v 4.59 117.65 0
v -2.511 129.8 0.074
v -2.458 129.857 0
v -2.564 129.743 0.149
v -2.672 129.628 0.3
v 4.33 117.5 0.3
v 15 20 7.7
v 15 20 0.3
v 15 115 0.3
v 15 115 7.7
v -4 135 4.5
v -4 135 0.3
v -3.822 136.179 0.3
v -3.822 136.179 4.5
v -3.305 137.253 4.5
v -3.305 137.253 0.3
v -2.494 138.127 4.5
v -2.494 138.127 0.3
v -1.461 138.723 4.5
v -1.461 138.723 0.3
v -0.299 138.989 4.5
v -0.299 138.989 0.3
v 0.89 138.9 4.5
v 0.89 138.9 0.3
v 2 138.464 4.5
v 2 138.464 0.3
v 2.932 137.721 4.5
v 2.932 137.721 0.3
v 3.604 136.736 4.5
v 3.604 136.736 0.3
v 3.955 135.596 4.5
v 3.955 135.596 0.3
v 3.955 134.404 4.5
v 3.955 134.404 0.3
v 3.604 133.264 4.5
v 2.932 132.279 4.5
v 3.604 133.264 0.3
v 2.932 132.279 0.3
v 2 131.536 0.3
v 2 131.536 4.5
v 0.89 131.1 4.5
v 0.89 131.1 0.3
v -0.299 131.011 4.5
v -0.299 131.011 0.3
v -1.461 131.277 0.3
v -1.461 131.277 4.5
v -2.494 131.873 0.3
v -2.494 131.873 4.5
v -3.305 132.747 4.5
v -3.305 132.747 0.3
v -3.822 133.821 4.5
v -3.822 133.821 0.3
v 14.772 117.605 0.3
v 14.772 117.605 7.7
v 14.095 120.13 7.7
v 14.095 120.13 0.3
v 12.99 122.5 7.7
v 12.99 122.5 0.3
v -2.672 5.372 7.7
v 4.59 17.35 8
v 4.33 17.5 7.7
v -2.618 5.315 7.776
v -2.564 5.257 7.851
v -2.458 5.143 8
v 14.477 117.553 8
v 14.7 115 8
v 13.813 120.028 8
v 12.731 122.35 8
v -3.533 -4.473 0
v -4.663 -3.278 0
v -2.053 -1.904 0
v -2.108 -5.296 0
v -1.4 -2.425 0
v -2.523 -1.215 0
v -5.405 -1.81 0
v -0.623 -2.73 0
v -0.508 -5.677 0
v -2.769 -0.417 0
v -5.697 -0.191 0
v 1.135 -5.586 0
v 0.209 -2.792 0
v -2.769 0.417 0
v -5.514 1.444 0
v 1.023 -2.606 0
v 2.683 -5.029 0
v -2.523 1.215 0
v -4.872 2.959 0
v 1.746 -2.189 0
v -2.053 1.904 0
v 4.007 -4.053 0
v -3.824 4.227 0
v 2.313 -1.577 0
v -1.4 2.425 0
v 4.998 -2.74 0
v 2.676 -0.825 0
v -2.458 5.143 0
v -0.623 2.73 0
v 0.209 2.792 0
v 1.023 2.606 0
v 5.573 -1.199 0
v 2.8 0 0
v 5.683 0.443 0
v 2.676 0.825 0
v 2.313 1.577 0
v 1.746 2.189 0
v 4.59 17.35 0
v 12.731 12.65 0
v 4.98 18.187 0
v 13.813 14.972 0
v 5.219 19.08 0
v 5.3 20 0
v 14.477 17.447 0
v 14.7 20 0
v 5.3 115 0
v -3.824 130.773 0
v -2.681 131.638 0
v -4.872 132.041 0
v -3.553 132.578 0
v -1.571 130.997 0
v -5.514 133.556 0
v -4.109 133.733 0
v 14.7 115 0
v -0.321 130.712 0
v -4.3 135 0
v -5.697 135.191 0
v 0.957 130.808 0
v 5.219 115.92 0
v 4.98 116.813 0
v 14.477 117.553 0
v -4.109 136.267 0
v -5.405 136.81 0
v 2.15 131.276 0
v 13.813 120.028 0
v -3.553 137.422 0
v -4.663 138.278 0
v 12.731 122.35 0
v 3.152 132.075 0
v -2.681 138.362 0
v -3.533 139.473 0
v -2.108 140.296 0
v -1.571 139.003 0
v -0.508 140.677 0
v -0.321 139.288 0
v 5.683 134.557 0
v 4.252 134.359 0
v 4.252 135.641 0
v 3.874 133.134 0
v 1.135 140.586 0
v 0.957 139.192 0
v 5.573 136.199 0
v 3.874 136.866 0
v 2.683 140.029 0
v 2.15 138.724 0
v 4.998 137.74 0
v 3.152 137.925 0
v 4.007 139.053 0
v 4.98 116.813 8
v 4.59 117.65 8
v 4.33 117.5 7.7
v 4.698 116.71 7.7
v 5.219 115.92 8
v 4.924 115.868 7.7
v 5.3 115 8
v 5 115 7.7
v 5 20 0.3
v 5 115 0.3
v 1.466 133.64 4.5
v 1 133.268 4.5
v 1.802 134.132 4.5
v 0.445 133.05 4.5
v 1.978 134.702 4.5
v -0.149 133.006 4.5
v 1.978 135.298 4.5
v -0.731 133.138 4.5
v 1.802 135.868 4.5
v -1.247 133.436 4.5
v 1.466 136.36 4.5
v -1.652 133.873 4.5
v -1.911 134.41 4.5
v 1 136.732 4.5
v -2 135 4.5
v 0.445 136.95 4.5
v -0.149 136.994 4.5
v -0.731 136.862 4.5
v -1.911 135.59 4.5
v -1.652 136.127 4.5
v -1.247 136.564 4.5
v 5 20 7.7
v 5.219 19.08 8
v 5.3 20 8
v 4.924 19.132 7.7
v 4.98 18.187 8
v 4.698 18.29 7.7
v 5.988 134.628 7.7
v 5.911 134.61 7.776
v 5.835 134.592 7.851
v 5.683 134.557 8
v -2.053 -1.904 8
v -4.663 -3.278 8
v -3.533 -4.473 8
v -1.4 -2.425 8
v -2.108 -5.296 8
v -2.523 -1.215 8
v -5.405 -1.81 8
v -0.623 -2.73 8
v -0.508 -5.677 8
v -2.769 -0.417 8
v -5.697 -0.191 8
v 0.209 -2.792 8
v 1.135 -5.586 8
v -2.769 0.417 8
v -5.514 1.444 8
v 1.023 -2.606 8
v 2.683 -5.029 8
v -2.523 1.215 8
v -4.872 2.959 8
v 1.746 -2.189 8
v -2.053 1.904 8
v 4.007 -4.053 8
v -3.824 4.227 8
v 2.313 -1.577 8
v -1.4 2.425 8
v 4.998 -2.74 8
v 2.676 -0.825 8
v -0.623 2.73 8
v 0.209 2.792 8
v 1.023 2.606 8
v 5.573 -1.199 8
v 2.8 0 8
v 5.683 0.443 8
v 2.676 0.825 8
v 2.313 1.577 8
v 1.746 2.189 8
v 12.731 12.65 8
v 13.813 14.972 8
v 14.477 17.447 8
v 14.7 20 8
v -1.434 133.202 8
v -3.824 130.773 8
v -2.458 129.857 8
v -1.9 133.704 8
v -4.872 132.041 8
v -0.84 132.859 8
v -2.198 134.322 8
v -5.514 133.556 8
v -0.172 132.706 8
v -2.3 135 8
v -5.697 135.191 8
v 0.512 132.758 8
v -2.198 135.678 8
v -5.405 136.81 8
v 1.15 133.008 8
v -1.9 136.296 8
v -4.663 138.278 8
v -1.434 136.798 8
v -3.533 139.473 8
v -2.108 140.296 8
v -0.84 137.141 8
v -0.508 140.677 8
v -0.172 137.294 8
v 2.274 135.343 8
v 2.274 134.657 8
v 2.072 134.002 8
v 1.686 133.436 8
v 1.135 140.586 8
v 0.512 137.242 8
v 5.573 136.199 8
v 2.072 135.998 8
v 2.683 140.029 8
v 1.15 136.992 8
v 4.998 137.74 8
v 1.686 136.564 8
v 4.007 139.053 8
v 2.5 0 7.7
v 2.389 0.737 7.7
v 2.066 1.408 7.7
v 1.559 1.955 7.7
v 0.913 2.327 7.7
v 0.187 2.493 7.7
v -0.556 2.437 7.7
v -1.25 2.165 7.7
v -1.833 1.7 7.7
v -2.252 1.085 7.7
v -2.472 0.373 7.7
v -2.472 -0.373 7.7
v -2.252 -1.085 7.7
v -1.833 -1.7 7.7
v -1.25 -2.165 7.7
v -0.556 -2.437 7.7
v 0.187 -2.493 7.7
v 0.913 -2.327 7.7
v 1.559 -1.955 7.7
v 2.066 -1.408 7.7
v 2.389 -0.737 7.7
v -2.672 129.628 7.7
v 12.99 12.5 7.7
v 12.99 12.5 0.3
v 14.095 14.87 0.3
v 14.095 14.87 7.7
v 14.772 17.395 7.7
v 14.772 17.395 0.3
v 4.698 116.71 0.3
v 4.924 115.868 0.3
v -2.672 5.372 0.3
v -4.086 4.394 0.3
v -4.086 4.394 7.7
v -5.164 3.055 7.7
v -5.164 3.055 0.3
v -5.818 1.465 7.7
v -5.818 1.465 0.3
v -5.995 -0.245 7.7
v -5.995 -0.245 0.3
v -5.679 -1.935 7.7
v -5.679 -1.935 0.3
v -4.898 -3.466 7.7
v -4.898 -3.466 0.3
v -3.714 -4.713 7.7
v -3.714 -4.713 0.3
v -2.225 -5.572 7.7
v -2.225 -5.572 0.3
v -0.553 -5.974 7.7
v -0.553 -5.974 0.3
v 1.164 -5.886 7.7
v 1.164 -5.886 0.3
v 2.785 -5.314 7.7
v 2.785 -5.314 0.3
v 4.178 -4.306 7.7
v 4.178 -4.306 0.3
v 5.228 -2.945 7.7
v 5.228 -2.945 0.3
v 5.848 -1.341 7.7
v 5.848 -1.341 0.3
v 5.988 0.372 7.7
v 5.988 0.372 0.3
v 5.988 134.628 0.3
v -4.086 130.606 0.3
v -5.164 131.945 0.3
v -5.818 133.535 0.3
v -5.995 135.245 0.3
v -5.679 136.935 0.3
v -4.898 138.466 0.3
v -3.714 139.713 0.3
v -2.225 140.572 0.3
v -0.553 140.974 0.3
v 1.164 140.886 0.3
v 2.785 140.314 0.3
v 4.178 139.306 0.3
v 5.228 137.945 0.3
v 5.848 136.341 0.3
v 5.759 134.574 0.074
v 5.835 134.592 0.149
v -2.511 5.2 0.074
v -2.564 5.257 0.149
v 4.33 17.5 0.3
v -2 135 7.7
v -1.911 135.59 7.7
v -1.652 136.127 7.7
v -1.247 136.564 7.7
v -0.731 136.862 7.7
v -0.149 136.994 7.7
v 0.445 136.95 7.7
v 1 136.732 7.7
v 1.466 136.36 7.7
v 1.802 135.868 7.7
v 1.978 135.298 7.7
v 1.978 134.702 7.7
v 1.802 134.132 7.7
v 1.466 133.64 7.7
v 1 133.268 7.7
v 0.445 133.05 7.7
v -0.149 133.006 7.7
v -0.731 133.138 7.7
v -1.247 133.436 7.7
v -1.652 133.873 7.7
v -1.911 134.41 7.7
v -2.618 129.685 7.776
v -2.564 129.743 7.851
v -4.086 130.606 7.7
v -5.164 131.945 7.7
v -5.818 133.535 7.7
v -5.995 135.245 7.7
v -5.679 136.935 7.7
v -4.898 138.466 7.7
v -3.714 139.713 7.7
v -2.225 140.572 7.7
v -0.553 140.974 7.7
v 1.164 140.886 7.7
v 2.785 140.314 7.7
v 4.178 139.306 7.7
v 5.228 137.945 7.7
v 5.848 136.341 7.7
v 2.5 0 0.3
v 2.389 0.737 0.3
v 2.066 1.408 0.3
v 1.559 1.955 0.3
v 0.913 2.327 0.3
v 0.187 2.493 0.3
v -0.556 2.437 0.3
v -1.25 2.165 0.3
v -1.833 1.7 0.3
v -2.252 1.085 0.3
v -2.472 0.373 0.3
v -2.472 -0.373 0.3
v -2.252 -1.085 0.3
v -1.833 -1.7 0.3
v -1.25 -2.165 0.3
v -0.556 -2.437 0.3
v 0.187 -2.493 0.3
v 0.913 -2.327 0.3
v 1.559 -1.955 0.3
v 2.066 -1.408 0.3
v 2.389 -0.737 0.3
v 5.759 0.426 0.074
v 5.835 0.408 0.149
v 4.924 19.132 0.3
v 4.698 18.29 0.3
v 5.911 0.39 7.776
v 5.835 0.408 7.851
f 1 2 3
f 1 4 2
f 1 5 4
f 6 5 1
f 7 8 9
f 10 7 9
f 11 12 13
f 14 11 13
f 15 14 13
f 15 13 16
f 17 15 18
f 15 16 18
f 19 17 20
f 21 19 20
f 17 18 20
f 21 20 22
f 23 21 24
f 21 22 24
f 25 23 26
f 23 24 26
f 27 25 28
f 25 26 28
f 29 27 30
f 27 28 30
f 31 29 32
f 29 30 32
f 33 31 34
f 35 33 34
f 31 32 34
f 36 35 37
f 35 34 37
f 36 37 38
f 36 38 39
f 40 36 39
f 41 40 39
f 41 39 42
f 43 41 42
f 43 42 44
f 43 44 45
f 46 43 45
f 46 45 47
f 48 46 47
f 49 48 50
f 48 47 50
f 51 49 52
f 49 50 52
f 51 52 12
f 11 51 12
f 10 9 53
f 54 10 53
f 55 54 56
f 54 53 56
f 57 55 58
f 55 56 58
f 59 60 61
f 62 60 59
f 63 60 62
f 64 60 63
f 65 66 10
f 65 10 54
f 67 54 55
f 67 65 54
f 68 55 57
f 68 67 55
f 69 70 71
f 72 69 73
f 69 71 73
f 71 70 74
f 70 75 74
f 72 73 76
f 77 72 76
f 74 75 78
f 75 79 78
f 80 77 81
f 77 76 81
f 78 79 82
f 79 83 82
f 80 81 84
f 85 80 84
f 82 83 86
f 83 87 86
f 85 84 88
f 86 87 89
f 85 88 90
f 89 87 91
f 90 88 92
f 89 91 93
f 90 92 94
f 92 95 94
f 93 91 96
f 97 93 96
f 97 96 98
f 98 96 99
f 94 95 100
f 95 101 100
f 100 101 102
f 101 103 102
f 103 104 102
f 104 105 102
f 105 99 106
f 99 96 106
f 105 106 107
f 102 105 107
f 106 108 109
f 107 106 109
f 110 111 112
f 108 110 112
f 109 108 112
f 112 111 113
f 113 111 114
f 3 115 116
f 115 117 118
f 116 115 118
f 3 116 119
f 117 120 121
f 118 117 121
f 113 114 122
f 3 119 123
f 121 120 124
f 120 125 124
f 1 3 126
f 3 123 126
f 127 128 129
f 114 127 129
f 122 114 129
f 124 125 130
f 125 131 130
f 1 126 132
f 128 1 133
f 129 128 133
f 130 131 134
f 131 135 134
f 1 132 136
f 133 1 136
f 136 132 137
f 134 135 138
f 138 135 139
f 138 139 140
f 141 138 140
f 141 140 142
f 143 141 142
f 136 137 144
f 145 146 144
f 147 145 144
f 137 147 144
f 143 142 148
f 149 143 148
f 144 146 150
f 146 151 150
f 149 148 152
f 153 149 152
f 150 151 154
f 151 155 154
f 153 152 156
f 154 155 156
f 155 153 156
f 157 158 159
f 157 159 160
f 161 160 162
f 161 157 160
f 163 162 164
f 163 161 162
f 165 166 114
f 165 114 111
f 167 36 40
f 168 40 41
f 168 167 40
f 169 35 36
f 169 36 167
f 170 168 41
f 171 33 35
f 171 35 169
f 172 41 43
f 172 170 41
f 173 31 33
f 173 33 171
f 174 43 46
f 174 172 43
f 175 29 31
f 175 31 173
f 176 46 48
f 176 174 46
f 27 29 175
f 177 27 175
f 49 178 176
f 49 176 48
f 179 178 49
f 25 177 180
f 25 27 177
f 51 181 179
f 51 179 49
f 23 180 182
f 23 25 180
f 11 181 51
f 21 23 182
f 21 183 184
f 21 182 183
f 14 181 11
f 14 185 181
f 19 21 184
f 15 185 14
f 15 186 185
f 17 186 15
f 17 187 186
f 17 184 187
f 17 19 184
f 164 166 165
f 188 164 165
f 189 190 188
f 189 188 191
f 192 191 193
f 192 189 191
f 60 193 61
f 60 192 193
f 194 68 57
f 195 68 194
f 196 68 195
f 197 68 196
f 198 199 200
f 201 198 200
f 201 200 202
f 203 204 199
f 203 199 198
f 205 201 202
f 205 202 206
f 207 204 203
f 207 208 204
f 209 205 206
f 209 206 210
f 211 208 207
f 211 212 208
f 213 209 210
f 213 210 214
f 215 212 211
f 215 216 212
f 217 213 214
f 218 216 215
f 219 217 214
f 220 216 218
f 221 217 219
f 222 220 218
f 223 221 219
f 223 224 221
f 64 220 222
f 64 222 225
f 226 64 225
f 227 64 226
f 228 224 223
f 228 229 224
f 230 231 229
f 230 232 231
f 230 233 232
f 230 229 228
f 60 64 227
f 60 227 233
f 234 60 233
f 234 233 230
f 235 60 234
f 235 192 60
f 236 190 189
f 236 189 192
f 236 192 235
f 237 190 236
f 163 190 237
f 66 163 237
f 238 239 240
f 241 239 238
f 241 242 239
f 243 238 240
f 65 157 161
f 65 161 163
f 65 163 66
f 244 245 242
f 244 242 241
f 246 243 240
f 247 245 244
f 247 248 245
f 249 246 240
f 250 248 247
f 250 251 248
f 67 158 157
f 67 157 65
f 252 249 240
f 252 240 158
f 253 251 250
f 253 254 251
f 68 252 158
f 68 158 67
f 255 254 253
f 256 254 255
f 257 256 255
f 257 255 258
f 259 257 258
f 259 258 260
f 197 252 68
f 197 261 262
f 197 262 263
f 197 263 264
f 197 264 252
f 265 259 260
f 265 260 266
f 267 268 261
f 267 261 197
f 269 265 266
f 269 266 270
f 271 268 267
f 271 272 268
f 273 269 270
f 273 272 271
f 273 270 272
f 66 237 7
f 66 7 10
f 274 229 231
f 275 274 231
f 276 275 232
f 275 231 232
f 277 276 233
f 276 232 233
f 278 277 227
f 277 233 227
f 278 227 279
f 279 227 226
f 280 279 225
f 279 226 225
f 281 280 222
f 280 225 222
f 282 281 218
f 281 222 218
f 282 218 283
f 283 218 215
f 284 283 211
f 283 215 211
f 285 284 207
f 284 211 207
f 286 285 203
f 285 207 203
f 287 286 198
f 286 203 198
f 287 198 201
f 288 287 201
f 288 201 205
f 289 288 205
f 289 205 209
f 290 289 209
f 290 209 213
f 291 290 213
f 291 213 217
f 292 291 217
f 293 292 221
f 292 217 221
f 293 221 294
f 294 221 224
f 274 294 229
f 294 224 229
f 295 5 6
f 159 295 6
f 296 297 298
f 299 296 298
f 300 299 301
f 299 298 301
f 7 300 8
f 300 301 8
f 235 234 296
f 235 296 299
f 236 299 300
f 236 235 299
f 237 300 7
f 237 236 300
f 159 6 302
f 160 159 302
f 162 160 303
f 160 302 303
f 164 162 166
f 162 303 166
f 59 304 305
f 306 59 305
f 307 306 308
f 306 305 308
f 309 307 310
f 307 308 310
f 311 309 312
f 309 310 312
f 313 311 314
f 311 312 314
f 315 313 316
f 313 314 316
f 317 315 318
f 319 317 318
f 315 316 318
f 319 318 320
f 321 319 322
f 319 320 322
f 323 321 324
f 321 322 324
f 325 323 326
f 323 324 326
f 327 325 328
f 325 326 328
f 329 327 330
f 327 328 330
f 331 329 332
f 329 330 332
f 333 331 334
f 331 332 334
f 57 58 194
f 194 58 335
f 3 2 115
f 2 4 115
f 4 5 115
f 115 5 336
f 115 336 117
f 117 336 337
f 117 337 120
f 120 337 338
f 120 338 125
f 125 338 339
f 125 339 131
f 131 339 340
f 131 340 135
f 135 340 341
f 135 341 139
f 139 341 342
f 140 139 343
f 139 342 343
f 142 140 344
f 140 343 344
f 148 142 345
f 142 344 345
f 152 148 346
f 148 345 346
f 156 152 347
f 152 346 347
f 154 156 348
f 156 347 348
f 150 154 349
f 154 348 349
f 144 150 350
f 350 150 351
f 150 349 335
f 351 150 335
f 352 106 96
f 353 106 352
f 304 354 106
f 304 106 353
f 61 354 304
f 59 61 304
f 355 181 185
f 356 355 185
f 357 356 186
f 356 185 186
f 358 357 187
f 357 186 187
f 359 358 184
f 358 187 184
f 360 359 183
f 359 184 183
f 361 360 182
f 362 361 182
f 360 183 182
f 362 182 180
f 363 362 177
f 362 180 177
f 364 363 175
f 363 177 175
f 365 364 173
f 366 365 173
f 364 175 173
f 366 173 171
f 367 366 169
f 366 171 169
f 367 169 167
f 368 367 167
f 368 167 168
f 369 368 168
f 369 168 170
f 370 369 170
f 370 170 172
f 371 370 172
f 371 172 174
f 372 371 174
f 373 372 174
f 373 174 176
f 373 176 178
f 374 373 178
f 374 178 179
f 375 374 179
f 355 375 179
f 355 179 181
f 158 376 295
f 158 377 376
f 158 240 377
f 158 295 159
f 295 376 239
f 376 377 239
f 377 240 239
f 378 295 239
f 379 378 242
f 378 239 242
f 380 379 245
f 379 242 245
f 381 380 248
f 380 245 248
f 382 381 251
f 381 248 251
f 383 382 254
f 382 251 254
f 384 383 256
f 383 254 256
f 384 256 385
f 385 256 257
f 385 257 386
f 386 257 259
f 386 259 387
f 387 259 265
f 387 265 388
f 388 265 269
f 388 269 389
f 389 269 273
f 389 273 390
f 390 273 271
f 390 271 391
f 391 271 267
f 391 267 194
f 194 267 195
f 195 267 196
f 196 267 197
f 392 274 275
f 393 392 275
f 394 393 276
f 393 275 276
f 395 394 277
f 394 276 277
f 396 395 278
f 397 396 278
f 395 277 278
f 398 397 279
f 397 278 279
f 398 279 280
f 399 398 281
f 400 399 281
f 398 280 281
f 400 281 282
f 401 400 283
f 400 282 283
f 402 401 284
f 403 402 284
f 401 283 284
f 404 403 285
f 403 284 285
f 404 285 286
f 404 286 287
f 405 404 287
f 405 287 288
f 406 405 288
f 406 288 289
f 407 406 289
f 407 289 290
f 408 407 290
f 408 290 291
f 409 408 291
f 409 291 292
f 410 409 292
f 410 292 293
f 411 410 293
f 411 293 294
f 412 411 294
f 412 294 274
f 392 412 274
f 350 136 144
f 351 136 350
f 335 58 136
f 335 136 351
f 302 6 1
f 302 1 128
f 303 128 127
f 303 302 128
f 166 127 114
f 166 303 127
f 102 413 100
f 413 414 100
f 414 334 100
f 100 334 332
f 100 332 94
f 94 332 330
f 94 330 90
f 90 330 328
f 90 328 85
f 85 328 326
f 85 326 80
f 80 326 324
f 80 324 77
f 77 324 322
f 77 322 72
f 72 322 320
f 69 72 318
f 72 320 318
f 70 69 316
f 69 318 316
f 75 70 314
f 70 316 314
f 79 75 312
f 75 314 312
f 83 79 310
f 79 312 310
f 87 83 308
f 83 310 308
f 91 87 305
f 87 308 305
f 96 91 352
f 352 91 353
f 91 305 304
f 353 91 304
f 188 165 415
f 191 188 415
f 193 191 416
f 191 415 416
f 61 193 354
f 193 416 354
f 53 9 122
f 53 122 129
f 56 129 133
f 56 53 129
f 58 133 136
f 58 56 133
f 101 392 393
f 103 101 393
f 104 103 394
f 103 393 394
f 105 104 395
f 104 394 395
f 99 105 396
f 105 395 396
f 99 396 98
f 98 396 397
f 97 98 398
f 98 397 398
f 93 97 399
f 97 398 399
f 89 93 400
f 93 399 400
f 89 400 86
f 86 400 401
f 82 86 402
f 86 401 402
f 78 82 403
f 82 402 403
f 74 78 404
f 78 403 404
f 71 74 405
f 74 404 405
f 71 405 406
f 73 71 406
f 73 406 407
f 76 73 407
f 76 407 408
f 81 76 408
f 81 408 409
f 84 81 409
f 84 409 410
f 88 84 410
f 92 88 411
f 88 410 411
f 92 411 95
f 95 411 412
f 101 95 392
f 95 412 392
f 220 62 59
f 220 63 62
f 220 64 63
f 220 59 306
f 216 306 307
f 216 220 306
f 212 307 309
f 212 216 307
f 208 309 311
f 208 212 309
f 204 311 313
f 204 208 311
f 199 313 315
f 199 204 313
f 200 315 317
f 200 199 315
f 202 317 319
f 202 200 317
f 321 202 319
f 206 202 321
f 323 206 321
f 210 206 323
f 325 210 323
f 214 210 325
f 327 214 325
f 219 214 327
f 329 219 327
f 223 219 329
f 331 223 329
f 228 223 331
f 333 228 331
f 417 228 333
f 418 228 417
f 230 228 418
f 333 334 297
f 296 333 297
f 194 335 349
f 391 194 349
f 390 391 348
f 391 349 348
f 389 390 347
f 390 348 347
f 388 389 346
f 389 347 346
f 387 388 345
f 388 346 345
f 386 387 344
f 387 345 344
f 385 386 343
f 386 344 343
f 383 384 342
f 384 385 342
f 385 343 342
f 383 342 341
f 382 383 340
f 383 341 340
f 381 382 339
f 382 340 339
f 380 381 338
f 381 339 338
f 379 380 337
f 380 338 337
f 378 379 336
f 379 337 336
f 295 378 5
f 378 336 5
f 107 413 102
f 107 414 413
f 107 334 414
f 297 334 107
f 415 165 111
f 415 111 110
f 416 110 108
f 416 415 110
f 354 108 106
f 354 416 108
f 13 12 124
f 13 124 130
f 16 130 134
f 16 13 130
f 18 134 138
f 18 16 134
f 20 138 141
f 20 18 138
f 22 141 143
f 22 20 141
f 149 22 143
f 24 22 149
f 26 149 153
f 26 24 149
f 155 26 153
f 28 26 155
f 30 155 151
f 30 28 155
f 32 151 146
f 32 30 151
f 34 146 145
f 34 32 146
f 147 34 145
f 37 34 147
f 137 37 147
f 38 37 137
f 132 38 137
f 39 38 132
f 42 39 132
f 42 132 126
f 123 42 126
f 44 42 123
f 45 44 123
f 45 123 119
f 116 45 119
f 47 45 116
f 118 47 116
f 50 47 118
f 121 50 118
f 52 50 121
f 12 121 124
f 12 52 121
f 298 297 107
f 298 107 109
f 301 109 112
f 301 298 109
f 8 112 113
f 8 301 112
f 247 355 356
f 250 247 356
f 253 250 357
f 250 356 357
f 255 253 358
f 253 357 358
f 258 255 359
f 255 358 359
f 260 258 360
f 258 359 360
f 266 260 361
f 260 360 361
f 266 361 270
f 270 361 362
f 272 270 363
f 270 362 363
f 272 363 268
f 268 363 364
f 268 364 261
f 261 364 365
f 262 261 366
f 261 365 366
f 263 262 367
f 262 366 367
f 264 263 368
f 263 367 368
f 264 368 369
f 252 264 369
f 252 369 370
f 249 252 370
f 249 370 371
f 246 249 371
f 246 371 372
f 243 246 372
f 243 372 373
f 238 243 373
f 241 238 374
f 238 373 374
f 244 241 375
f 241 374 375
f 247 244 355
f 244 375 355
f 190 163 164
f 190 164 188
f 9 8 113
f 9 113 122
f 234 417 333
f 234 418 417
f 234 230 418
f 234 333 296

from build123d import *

# Parameters (mm, degrees)
SKETCH_1_R          = 6
EXTRUDE_1_DEPTH     = 8
EXTRUDE_1_2_DEPTH   = 8
EXTRUDE_1_3_DEPTH   = 8
SKETCH_3_R          = 2.5
CUT_EXTRUDE_1_DEPTH = 9
SKETCH_4_R          = 2
CUT_EXTRUDE_2_DEPTH = 9
SKETCH_5_R          = 4
CUT_EXTRUDE_3_DEPTH = 4.5
CHAMFER_1_SIZE      = 0.3


with BuildPart() as part:
    # 草图1 → Extrude 1 (new body)
    with BuildSketch(Plane.XY):
        Circle(SKETCH_1_R)
    extrude(amount=EXTRUDE_1_DEPTH)



with BuildPart() as body_2:
    # 草图1 → Extrude 1 2 (new body)
    with BuildSketch(Plane.XY):
        with Locations((0, 135)):
            Circle(SKETCH_1_R)
    extrude(amount=EXTRUDE_1_2_DEPTH)


with BuildPart() as part_1:
    add(part.part)

    add(body_2.part)  # Extrude 1 3 merges body 2
    # 草图2 → Extrude 1 3 (add)
    with BuildSketch(Plane.XY):
        with BuildLine():
            Line((-4.330127019, 132.5), (4.330127019, 117.5))
            ThreePointArc((4.330127019, 117.5), (4.829629131, 116.294095226), (5, 115))
            Line((5, 115), (5, 20))
            ThreePointArc((5, 20), (4.829629131, 18.705904774), (4.330127019, 17.5))
            Line((4.330127019, 17.5), (-4.330127019, 2.5))
            Line((-4.330127019, 2.5), (4.330127019, -2.5))
            Line((4.330127019, -2.5), (12.990381057, 12.5))
            ThreePointArc((12.990381057, 12.5), (14.488887394, 16.117714323), (15, 20))
            Line((15, 20), (15, 115))
            ThreePointArc((15, 115), (14.488887394, 118.882285677), (12.990381057, 122.5))
            Line((12.990381057, 122.5), (4.330127019, 137.5))
            Line((4.330127019, 137.5), (-4.330127019, 132.5))
        make_face()
    extrude(amount=EXTRUDE_1_3_DEPTH)

    # 草图3 → 切除-拉伸1 (cut, through all)
    with BuildSketch(Plane.XY.offset(8)):
        Circle(SKETCH_3_R)
    extrude(amount=-CUT_EXTRUDE_1_DEPTH, mode=Mode.SUBTRACT)

    # 草图4 → 切除-拉伸2 (cut, through all)
    with BuildSketch(Plane(origin=(0, 0, 0), x_dir=(-1, 0, 0), z_dir=(0, 0, -1))):
        with Locations((0, 135)):
            Circle(SKETCH_4_R)
    extrude(amount=-CUT_EXTRUDE_2_DEPTH, mode=Mode.SUBTRACT)

    # 草图5 → 切除-拉伸3 (cut)
    with BuildSketch(Plane(origin=(0, 0, 0), x_dir=(-1, 0, 0), z_dir=(0, 0, -1))):
        with Locations((0, 135)):
            Circle(SKETCH_5_R)
    extrude(amount=-CUT_EXTRUDE_3_DEPTH, mode=Mode.SUBTRACT)

    # 倒角1
    chamfer_1_edges = [part_1.edges().sort_by_distance(p)[0] for p in [
        (0.829156198, 11.436140662, 0),
        (9.489410235, 6.436140662, 8),
        (14.488887394, 16.117714323, 8),
        (15, 67.5, 8),
        (14.488887394, 118.882285677, 8),
        (4.829629131, 116.294095226, 0),
        (5, 67.5, 0),
        (4.829629131, 18.705904774, 0),
        (9.489410235, 6.436140662, 0),
        (14.488887394, 118.882285677, 0),
        (15, 67.5, 0),
        (14.488887394, 16.117714323, 0),
        (4.829629131, 116.294095226, 8),
        (5, 67.5, 8),
        (4.829629131, 18.705904774, 8),
        (0.829156198, 11.436140662, 8),
        (0.829156198, 123.563859338, 8),
        (0.829156198, 123.563859338, 0),
        (9.489410235, 128.563859338, 8),
        (9.489410235, 128.563859338, 0),
        (-3, 140.196152423, 0),
        (-3, 140.196152423, 8),
        (-2.5, 0, 0),
        (-2.5, 0, 8),
        (-3, -5.196152423, 0),
        (2, 135, 8),
        (4, 135, 0),
        (-3, -5.196152423, 8),
    ]]
    chamfer(chamfer_1_edges, length=CHAMFER_1_SIZE)


solid = part_1.part
